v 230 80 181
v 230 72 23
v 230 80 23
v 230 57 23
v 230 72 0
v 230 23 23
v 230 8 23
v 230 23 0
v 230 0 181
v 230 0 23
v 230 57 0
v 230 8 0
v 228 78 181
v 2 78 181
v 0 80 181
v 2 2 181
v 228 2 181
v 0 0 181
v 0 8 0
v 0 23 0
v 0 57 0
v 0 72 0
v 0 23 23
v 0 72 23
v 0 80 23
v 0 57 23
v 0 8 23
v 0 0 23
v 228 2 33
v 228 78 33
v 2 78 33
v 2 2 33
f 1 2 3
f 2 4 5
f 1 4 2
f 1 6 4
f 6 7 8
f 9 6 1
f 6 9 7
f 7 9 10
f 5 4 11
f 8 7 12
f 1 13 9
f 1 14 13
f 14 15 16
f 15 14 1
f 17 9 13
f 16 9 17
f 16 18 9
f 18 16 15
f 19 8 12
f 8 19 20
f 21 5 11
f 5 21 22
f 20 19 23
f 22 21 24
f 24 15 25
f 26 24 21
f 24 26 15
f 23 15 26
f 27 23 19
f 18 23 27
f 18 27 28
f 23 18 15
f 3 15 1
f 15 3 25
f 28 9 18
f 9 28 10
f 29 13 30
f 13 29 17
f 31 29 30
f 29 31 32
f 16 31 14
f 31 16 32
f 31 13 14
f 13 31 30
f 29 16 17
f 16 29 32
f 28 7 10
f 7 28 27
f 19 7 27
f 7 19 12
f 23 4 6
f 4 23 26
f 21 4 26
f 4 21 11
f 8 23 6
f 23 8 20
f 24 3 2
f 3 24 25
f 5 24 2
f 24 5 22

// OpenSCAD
/*
Finishing instructions:
Should be cut and add connectoris on top of the legs
CutZ = legsZ = 23
Connectors length should be: specialBottomForCuttingLegsZ = 8
*/
// The resolution variables:
$fa = 1;
$fs = 0.4;

// Main dimensions
mainBodyX = 230;
mainBodyY = 80;
mainBoxBodyZ = 150;
legsZ = 23;
legThicknessY = 15;
legOneOffsetY = 8; // Distance from y=0 till the start of the first leg
legTwoOffsetY = mainBodyY - (legOneOffsetY + legThicknessY); // Distance from y=0 till the start of 2nd leg
specialBottomForCuttingLegsZ = 8; 
mainBodyZ = mainBoxBodyZ + legsZ + specialBottomForCuttingLegsZ;
wallThikness = 2;
bottomWallZ = wallThikness + specialBottomForCuttingLegsZ;
distanceBetweenTwoLegsY = mainBodyY - (legThicknessY * 2) - (legOneOffsetY * 2); // = 34

// Main body
difference(){
    cube([mainBodyX,mainBodyY,mainBodyZ]);

    // Top - box hole
    translate([wallThikness, wallThikness, legsZ + bottomWallZ])
        cube([mainBodyX - (wallThikness * 2), mainBodyY - (wallThikness * 2), mainBoxBodyZ * 2]);
    
    // Bottom - 1/3 legs holes
    translate([-2, -1, -2])
        cube([mainBodyX * 2, legOneOffsetY + 1, legsZ + 2]);
    
    // Bottom - 2/3 legs holes
    translate([-2, legOneOffsetY + legThicknessY, -2])
        cube([mainBodyX * 2, distanceBetweenTwoLegsY, legsZ + 2]);

    // Bottom - 3/3 legs holes
    translate([-2, legTwoOffsetY + legThicknessY, -2])
        cube([mainBodyX * 2, legOneOffsetY * 2, legsZ + 2]);
}
